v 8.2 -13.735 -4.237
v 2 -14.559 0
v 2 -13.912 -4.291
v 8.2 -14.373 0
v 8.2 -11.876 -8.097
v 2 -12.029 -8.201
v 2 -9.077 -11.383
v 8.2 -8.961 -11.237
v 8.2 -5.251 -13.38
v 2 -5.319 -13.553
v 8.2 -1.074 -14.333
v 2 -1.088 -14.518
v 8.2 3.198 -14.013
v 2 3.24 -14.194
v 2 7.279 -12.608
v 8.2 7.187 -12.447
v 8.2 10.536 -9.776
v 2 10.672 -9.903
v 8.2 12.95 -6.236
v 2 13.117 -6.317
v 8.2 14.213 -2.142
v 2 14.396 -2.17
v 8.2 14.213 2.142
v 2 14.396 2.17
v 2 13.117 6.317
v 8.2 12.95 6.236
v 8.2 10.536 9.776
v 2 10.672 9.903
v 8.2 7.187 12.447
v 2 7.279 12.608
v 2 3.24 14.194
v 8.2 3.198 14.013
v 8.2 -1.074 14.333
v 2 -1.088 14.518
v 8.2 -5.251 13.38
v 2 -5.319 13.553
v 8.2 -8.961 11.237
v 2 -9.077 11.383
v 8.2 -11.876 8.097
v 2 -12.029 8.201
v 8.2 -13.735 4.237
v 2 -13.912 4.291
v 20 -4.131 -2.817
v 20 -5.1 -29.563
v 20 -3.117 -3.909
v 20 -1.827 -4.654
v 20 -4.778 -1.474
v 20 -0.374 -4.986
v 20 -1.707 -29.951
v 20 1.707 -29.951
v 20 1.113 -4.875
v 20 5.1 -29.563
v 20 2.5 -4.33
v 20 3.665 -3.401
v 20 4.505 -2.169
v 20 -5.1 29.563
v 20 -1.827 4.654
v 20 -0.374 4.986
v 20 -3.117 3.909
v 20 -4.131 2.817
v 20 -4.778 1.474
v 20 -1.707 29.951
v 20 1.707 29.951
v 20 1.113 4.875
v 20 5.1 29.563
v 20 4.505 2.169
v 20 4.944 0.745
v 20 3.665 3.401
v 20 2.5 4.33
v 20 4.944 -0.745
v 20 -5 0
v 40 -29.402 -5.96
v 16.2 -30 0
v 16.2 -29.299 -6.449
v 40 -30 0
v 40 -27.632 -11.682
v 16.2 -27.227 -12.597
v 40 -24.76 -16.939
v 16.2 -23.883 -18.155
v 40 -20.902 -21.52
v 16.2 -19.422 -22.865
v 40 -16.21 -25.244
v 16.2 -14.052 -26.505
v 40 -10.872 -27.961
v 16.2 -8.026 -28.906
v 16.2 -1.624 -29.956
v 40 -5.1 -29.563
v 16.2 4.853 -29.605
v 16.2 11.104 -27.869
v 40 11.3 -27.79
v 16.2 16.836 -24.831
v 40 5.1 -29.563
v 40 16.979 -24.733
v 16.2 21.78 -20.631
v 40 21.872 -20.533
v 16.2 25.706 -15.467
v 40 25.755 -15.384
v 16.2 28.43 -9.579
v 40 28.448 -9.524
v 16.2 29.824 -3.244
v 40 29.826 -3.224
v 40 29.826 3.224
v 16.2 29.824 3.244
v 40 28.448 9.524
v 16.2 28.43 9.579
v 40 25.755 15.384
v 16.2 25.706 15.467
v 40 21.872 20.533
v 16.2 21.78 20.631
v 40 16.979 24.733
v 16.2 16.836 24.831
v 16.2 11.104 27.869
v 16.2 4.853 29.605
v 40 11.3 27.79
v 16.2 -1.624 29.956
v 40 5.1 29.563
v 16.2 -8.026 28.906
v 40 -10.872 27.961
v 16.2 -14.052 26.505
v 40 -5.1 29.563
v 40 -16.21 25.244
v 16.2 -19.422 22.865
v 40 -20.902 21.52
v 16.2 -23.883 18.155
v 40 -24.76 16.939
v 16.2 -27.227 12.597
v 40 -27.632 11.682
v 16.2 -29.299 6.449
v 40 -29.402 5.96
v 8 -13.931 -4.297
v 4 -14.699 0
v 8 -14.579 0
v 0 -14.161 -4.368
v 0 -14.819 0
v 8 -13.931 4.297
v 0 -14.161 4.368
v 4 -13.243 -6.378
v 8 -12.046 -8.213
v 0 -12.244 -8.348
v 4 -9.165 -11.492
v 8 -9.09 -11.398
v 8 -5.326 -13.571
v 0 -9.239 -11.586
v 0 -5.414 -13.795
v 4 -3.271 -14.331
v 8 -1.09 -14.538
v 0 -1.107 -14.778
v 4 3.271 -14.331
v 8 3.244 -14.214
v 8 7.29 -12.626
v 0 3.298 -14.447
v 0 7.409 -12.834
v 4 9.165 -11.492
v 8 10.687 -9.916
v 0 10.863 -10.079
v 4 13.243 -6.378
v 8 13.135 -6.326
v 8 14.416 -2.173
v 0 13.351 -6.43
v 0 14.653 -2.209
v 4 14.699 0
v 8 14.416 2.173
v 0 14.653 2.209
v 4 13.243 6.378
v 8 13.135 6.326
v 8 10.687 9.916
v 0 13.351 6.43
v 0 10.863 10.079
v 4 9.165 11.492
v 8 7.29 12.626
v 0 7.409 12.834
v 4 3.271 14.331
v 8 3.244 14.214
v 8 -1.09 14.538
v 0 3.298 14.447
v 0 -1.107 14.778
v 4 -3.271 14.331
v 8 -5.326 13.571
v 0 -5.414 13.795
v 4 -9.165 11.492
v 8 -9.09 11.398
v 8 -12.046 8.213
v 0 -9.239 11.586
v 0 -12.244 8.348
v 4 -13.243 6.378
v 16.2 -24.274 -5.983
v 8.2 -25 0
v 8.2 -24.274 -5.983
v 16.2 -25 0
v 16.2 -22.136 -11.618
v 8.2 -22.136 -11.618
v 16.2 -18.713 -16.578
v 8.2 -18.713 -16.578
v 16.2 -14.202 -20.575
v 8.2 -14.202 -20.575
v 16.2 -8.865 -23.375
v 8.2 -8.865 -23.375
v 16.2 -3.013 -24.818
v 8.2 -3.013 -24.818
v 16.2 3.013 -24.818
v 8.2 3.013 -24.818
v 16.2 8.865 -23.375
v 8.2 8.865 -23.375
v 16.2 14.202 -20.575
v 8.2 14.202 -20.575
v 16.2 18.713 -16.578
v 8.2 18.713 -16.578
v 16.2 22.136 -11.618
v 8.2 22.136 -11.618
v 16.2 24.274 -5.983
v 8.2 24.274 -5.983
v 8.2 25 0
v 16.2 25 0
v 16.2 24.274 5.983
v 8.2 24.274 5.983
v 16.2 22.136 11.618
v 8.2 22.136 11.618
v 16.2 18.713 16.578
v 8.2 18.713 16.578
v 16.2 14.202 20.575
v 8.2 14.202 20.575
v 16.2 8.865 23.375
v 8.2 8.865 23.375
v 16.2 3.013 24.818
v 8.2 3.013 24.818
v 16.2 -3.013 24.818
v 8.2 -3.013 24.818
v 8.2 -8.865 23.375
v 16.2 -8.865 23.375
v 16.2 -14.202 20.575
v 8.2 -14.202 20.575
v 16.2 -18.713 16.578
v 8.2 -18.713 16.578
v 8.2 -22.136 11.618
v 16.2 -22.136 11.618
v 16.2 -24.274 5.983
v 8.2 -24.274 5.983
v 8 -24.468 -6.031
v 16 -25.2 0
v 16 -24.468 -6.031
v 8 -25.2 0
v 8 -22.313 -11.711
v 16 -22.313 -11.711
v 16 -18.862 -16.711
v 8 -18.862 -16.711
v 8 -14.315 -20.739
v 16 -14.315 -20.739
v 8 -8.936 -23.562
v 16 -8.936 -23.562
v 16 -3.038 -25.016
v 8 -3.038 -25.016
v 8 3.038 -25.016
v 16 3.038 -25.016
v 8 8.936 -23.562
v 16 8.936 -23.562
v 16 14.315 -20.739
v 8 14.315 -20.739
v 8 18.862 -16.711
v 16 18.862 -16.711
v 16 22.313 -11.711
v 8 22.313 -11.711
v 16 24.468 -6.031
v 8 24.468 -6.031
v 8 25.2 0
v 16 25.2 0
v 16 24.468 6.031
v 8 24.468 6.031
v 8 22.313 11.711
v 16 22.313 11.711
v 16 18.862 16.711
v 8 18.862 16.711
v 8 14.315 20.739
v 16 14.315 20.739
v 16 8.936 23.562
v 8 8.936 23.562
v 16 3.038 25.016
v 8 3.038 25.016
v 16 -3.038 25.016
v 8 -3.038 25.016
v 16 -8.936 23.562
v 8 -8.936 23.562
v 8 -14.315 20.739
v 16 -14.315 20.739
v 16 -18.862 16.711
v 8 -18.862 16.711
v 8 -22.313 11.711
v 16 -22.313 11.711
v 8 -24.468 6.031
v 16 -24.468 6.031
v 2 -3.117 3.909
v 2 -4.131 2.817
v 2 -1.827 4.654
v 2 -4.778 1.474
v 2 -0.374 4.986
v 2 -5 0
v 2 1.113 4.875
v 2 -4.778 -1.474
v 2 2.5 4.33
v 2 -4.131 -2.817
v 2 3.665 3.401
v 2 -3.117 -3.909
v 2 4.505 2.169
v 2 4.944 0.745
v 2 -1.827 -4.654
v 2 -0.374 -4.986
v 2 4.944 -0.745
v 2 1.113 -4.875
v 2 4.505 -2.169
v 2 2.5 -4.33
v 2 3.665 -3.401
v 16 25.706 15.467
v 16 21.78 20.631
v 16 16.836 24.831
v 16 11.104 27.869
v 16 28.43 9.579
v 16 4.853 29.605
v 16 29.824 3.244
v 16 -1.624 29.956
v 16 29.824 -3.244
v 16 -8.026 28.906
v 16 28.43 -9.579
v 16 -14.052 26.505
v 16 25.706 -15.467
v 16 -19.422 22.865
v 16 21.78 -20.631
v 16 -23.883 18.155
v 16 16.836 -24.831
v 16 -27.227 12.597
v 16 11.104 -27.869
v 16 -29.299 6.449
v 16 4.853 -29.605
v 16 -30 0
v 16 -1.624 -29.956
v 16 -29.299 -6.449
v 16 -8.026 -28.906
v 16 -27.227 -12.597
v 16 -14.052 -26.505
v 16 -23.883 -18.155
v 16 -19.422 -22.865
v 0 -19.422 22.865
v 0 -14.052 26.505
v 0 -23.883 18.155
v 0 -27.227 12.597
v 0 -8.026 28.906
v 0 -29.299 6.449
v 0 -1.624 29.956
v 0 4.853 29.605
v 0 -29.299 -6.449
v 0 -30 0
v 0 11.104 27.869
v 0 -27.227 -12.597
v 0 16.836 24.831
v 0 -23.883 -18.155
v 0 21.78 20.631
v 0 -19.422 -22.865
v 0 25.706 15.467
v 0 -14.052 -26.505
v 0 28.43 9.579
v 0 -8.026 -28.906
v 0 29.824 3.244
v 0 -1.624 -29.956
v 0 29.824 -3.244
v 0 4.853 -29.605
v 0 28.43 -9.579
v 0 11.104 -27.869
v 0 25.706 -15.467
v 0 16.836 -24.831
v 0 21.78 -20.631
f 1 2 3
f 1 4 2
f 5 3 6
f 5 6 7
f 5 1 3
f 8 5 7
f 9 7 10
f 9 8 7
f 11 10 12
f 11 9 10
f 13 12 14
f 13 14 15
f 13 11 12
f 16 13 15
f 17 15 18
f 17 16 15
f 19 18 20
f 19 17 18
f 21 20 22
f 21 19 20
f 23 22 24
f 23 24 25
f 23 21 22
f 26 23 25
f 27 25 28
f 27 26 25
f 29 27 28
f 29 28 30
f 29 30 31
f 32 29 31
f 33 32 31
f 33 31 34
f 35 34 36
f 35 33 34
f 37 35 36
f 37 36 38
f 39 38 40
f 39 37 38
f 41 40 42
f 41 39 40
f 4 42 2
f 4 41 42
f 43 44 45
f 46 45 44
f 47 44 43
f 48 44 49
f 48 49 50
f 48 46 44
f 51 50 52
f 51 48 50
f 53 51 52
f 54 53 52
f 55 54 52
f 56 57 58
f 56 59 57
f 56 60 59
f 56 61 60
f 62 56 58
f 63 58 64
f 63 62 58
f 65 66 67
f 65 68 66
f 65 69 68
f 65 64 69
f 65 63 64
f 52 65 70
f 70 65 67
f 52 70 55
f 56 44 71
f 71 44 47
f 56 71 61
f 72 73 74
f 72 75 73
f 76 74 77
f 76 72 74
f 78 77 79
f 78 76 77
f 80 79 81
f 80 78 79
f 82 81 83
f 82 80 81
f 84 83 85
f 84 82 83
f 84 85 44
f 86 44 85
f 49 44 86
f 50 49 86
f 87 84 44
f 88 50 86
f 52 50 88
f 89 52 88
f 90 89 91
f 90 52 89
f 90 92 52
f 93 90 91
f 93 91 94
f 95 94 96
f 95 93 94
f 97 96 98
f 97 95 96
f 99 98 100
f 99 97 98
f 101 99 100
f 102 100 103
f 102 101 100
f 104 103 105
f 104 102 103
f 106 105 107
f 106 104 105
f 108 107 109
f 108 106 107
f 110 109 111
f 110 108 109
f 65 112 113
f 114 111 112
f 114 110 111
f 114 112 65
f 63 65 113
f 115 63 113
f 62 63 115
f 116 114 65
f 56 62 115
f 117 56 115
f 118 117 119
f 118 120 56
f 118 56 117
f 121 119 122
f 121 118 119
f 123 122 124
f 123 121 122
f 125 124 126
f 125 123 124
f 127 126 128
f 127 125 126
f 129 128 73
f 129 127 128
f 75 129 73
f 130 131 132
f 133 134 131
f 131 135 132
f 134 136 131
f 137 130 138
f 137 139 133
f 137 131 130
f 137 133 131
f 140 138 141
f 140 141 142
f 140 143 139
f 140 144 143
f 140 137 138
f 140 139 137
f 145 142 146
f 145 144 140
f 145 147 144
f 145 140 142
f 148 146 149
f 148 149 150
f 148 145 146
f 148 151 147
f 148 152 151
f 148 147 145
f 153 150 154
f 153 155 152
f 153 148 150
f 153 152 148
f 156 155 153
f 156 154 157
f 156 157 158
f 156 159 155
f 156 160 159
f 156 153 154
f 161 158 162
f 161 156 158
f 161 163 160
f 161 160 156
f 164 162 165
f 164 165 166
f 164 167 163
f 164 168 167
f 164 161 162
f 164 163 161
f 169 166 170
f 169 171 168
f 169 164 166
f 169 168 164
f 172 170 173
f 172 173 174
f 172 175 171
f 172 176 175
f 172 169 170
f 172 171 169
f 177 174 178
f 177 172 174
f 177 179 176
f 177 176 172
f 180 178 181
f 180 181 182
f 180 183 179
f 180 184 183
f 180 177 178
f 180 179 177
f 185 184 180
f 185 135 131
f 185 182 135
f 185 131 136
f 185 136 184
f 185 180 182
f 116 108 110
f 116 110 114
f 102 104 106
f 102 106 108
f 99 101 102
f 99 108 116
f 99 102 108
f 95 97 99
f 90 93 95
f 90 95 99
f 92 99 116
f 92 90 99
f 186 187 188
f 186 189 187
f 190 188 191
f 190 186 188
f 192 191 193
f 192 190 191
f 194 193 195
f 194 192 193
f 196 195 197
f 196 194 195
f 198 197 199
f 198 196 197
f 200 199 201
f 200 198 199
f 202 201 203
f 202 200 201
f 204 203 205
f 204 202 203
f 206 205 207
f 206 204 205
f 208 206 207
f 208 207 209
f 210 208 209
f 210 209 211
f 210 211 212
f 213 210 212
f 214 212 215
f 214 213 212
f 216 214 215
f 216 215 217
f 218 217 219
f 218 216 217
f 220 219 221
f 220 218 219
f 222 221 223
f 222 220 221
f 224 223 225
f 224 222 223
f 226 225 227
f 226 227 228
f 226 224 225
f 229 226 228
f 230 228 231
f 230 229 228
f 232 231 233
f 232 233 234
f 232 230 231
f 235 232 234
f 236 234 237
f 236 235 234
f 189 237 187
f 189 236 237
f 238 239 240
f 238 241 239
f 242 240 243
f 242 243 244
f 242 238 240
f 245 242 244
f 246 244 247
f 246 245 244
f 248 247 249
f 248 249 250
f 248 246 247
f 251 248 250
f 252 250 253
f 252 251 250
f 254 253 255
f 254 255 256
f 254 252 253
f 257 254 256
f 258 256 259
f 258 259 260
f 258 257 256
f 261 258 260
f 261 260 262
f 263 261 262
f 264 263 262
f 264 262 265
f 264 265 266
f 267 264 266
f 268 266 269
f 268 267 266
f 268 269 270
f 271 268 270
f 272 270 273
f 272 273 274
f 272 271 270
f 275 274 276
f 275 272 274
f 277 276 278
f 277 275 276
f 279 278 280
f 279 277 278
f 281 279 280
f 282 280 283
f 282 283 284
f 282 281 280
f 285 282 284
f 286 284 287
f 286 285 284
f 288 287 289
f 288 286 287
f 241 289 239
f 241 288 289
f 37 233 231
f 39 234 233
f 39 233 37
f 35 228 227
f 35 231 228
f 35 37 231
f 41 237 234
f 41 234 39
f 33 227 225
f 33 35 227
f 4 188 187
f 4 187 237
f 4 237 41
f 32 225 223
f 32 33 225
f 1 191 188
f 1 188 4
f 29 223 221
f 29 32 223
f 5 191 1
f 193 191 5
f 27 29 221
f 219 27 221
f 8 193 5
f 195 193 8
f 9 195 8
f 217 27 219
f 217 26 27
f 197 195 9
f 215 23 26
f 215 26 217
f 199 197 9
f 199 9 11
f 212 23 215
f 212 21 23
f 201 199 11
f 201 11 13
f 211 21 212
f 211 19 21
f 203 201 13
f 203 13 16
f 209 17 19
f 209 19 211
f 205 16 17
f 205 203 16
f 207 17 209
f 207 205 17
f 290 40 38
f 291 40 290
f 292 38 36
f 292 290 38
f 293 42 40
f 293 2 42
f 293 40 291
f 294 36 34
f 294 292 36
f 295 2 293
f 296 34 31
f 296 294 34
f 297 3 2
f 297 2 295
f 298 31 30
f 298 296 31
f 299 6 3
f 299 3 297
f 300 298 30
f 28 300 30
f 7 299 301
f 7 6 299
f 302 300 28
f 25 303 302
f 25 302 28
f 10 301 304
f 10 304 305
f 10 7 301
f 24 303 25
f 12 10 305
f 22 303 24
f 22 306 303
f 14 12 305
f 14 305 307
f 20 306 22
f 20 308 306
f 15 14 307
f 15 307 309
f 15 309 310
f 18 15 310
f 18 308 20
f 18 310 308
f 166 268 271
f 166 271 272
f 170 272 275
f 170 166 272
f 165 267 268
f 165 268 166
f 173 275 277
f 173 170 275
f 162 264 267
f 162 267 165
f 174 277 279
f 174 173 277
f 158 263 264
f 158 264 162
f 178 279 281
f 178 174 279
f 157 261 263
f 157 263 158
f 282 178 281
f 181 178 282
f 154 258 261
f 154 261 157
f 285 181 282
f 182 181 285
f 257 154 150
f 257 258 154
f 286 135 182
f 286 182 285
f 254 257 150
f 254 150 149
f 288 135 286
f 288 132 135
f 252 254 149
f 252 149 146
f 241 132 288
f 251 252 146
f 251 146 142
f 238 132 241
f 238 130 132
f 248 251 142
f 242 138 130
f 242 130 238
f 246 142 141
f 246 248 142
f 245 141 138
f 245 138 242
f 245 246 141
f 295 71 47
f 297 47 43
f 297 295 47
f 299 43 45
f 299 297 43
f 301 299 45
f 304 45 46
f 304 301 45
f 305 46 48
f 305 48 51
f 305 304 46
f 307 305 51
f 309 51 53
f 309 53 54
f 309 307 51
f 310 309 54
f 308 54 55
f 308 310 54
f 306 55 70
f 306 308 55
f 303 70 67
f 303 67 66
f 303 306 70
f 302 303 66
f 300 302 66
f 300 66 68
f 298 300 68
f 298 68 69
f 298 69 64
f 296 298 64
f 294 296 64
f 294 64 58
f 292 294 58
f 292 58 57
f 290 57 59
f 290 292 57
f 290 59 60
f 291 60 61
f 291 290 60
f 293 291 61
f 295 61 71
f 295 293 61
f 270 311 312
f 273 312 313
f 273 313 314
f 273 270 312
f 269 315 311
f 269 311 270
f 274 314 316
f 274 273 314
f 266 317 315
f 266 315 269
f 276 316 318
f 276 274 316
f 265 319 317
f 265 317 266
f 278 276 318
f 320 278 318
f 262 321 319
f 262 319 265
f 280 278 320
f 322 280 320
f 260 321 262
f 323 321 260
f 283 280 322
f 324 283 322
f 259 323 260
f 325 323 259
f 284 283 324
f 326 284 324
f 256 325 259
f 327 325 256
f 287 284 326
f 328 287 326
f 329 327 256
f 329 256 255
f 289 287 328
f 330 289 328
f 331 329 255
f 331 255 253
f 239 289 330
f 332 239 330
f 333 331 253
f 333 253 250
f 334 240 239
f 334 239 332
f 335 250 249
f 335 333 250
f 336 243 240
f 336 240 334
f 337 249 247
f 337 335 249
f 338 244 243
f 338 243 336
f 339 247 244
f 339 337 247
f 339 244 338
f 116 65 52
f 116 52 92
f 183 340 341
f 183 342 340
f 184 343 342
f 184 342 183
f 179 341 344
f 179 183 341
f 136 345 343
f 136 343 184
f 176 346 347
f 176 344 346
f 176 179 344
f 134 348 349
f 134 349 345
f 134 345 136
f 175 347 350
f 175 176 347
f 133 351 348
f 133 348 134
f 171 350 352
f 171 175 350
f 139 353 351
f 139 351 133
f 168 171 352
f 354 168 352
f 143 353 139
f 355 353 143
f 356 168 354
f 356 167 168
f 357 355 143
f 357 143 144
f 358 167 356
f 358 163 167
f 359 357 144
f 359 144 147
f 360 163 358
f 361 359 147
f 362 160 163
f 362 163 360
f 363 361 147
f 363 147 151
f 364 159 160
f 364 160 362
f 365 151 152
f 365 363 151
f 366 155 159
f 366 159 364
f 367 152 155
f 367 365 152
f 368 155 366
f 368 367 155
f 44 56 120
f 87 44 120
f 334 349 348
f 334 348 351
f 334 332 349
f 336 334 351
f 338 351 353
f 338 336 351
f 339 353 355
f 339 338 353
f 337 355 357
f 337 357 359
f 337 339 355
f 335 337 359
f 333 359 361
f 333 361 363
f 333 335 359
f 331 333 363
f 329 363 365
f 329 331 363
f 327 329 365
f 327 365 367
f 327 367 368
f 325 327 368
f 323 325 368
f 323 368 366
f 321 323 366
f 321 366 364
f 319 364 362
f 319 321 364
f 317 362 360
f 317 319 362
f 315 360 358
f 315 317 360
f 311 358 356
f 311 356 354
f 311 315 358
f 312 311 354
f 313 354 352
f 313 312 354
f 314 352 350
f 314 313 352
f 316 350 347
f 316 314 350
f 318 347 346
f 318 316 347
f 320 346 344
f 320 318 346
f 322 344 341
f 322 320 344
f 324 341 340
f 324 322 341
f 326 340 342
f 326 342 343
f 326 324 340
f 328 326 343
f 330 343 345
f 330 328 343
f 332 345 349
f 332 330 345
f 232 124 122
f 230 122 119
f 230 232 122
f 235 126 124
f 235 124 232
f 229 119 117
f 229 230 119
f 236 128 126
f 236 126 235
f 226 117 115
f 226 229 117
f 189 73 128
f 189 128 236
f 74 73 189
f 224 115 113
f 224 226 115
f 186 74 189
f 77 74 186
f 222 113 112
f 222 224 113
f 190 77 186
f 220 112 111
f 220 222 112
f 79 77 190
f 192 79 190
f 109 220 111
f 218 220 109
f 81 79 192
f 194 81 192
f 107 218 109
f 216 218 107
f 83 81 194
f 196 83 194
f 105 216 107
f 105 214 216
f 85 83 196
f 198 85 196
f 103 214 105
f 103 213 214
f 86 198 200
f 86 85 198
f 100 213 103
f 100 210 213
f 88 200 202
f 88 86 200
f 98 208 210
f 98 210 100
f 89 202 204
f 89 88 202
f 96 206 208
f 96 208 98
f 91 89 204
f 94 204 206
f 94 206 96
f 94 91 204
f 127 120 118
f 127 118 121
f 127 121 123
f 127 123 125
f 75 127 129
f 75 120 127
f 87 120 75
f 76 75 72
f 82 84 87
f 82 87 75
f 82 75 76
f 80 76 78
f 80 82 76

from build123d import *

# Parameters (mm, degrees)
F2_W          = 40
F2_H          = 10.2
F3_DEPTH      = 30.001
F3_DEPTH_BACK = 30.001


with BuildPart() as f1:
    # F0 (on Top) → F1 (revolve)
    with BuildSketch(Plane.XY):
        Polygon((8, -14.5792039363), (0, -14.8189625977), (0, -30), (16, -30), (16, -25.2), (8, -25.2), align=None)
    revolve(axis=Axis((26.4397524297, 0, 0), (1, 0, 0)))


with BuildPart() as f1b:
    # F0 (on Top) → F1, piece 2 (revolve)
    with BuildSketch(Plane.XY):
        Polygon((8.2, -14.3731201708), (8.2, -25), (16.2, -25), (16.2, -30), (40, -30), (40, -5), (2, -5), (2, -14.5589331334), align=None)
    revolve(axis=Axis((26.4397524297, 0, 0), (1, 0, 0)))

    # F2 (on Top) → F3 (cut, two sides)
    with BuildSketch(Plane.XY) as f3_sk:
        with Locations((40, 0)):
            Rectangle(F2_W, F2_H)
    extrude(amount=-F3_DEPTH, mode=Mode.SUBTRACT)
    extrude(f3_sk.sketch, amount=F3_DEPTH_BACK, mode=Mode.SUBTRACT)


solid = Compound([f1.part, f1b.part])
